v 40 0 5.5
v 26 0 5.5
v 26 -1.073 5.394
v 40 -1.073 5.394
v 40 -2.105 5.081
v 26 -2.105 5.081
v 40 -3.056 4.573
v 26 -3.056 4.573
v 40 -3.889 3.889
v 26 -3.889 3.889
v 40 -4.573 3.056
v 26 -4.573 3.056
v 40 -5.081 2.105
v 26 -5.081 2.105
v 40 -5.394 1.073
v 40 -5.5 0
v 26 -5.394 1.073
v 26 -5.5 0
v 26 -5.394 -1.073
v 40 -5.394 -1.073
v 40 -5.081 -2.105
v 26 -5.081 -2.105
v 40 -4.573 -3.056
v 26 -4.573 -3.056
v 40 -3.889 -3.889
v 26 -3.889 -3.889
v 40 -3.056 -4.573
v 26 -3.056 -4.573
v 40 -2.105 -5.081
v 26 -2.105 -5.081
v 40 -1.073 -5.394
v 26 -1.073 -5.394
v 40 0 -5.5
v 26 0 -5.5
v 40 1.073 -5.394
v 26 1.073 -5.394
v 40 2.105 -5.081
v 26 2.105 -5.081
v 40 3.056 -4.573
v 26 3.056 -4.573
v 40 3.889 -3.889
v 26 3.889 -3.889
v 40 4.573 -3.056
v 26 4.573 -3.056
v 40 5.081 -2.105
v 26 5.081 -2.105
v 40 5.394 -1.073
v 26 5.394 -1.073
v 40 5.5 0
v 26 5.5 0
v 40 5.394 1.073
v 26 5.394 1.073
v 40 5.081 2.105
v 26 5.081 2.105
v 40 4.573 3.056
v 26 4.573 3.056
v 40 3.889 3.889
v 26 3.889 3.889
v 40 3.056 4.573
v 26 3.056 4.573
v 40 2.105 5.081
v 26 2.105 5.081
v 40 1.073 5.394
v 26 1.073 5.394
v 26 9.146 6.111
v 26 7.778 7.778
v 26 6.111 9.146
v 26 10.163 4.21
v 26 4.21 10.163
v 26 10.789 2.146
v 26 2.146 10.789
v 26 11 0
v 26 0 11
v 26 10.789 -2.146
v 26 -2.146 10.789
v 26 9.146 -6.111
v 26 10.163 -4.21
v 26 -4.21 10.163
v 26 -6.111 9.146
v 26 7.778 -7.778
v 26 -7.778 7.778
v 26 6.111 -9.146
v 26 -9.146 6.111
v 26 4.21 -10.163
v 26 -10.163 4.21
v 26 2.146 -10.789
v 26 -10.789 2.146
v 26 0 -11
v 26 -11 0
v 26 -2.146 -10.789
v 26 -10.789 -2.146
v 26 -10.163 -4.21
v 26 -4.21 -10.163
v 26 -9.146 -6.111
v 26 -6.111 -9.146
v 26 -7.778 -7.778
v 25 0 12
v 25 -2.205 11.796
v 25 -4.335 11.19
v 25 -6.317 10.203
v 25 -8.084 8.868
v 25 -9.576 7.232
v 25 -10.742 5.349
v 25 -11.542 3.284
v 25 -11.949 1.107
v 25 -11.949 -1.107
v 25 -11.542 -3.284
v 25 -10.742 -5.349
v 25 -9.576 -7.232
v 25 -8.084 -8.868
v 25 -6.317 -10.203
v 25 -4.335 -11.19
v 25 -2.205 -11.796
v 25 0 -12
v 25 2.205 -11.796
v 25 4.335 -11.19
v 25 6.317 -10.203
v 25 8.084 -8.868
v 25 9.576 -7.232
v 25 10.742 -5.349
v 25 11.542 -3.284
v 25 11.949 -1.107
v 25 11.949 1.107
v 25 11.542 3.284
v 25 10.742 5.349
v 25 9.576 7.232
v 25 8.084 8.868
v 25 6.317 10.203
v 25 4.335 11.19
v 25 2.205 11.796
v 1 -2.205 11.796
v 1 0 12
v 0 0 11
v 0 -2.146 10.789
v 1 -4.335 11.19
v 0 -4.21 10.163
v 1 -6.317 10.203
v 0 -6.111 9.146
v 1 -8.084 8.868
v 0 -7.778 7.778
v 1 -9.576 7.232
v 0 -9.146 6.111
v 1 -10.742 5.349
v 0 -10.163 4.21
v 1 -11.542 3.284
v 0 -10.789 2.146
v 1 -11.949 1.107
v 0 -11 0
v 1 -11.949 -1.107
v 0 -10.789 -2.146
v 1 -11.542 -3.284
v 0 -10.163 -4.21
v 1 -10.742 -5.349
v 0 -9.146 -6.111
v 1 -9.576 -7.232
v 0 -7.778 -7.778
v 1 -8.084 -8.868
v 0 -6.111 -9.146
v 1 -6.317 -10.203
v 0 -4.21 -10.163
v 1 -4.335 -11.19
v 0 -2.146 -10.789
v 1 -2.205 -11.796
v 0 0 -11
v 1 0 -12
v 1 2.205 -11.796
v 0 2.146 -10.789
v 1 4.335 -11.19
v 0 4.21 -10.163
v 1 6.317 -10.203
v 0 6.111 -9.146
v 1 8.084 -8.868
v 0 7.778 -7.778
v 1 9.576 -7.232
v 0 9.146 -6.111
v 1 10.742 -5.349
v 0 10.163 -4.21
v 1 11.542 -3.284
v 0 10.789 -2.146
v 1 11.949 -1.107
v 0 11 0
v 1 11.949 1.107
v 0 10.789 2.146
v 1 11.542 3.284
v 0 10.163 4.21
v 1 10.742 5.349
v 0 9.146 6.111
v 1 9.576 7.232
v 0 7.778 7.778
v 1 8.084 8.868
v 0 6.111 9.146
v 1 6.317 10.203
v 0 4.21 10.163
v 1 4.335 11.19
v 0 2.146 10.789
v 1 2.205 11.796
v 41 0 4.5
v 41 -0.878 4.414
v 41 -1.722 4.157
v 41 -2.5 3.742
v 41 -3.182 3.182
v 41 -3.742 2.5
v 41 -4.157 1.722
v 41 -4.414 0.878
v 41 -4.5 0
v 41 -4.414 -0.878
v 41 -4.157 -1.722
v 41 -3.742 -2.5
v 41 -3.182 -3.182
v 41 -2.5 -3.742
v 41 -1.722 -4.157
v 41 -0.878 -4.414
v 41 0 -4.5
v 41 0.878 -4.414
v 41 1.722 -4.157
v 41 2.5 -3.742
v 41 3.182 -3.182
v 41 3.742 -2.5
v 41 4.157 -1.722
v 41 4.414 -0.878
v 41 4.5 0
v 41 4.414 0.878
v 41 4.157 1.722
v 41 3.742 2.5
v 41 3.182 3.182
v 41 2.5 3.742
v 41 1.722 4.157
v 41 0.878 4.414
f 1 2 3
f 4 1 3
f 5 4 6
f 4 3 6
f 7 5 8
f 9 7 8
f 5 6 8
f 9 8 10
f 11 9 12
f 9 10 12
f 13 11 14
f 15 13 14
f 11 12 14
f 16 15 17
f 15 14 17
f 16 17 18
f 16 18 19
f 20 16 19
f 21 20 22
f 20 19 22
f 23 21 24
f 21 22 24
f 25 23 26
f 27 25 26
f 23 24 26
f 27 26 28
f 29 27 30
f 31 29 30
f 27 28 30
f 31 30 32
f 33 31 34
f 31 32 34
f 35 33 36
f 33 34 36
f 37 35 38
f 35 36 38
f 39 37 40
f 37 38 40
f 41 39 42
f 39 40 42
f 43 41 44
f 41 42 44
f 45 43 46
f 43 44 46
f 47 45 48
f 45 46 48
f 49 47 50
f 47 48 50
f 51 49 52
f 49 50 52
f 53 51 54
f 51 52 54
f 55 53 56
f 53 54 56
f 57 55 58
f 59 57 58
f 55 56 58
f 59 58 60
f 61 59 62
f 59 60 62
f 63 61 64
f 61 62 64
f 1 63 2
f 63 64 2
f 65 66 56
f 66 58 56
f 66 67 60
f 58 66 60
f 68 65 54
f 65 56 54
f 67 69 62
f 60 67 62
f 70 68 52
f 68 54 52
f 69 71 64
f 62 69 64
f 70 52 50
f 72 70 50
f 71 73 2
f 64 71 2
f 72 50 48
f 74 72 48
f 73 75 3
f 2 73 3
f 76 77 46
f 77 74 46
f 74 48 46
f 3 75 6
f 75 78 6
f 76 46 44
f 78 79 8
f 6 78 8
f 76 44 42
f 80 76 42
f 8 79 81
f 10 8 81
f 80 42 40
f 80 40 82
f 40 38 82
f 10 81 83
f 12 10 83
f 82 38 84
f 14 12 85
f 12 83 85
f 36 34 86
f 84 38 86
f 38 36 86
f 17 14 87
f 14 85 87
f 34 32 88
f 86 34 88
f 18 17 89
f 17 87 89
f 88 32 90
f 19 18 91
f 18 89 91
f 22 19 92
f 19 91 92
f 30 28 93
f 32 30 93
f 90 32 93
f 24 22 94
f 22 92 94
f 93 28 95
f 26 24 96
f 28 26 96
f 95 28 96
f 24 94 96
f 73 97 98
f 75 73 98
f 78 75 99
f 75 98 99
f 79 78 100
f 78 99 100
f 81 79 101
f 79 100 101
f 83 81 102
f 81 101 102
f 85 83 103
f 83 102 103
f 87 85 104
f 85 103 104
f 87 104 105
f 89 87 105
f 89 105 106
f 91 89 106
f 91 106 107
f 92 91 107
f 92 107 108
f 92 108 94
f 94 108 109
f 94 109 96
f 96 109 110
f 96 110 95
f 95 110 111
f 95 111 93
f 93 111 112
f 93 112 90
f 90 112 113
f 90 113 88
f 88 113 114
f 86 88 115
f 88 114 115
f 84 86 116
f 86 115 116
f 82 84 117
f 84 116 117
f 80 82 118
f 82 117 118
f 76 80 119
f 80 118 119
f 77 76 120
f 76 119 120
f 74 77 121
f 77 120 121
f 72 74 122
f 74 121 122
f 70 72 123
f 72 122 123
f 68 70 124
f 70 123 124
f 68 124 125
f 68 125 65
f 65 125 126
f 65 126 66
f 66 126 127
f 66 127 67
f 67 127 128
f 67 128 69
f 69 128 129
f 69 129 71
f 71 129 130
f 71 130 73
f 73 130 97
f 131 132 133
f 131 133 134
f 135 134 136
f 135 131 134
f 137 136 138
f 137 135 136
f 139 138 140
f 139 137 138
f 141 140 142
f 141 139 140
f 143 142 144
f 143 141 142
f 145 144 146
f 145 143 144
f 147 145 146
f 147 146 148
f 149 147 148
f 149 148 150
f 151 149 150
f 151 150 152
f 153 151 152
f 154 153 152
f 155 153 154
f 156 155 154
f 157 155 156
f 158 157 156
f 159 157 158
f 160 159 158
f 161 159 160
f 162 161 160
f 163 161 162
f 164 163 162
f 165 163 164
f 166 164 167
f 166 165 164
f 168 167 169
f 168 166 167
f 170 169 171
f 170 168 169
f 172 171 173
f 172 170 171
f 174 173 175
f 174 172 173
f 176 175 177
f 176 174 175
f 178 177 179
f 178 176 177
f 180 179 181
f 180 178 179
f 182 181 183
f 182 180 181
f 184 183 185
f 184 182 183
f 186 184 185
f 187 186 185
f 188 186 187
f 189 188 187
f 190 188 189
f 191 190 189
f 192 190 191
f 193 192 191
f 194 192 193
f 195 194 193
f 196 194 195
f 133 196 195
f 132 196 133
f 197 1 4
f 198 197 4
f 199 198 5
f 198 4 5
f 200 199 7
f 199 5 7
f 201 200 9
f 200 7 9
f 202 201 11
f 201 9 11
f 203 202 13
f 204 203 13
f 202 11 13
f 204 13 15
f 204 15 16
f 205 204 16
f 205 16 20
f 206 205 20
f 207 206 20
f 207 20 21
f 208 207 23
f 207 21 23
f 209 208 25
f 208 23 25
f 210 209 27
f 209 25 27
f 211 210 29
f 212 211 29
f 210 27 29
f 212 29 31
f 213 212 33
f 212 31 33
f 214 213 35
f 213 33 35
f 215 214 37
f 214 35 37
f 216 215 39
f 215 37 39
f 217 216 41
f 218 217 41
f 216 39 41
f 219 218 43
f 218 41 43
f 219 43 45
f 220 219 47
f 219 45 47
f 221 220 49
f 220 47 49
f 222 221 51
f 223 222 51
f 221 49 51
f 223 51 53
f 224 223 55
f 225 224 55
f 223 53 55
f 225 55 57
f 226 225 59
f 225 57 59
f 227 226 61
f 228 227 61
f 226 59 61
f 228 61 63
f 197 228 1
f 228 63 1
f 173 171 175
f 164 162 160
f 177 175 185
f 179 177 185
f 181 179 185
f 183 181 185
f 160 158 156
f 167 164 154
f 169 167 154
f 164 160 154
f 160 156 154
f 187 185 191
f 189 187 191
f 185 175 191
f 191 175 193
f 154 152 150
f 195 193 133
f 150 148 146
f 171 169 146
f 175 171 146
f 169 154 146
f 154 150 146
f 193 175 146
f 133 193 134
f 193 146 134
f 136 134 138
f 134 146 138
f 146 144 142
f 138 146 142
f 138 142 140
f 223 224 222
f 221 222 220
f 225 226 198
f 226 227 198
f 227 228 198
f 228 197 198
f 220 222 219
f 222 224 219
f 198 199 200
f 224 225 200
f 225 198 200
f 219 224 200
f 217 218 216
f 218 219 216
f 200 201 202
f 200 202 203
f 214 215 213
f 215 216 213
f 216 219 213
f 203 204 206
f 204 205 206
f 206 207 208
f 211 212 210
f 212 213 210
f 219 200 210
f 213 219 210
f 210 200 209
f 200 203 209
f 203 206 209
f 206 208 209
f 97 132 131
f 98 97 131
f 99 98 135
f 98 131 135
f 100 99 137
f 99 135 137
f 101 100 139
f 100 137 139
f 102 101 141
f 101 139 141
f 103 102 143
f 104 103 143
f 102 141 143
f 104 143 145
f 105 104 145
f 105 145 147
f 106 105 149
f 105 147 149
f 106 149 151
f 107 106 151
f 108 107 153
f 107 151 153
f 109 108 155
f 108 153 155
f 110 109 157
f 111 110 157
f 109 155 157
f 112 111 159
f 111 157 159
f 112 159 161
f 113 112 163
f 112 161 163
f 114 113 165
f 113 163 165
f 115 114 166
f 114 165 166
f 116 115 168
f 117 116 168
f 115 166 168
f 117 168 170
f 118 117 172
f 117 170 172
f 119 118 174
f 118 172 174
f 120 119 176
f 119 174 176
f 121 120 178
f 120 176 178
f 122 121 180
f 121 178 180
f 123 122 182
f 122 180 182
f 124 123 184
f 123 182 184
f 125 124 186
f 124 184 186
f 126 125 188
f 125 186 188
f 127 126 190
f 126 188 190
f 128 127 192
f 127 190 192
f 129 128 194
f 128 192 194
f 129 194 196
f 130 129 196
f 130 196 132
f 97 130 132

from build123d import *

# Parameters (mm, degrees)
F2_SIZE = 1


with BuildPart() as f1:
    # F0 (on Front) → F1 (revolve)
    with BuildSketch(Plane.XZ):
        Polygon((0, 12), (0, 0), (41, 0), (41, 5.5), (26, 5.5), (26, 12), align=None)
    revolve(axis=Axis((19.196044, 0, 0), (1, 0, 0)))

    # F2
    f2_edges = [f1.edges().sort_by_distance(p)[0] for p in [
        (0, 0, -12),
        (26, 0, -12),
        (41, 0, -5.5),
    ]]
    chamfer(f2_edges, length=F2_SIZE)


solid = f1.part
